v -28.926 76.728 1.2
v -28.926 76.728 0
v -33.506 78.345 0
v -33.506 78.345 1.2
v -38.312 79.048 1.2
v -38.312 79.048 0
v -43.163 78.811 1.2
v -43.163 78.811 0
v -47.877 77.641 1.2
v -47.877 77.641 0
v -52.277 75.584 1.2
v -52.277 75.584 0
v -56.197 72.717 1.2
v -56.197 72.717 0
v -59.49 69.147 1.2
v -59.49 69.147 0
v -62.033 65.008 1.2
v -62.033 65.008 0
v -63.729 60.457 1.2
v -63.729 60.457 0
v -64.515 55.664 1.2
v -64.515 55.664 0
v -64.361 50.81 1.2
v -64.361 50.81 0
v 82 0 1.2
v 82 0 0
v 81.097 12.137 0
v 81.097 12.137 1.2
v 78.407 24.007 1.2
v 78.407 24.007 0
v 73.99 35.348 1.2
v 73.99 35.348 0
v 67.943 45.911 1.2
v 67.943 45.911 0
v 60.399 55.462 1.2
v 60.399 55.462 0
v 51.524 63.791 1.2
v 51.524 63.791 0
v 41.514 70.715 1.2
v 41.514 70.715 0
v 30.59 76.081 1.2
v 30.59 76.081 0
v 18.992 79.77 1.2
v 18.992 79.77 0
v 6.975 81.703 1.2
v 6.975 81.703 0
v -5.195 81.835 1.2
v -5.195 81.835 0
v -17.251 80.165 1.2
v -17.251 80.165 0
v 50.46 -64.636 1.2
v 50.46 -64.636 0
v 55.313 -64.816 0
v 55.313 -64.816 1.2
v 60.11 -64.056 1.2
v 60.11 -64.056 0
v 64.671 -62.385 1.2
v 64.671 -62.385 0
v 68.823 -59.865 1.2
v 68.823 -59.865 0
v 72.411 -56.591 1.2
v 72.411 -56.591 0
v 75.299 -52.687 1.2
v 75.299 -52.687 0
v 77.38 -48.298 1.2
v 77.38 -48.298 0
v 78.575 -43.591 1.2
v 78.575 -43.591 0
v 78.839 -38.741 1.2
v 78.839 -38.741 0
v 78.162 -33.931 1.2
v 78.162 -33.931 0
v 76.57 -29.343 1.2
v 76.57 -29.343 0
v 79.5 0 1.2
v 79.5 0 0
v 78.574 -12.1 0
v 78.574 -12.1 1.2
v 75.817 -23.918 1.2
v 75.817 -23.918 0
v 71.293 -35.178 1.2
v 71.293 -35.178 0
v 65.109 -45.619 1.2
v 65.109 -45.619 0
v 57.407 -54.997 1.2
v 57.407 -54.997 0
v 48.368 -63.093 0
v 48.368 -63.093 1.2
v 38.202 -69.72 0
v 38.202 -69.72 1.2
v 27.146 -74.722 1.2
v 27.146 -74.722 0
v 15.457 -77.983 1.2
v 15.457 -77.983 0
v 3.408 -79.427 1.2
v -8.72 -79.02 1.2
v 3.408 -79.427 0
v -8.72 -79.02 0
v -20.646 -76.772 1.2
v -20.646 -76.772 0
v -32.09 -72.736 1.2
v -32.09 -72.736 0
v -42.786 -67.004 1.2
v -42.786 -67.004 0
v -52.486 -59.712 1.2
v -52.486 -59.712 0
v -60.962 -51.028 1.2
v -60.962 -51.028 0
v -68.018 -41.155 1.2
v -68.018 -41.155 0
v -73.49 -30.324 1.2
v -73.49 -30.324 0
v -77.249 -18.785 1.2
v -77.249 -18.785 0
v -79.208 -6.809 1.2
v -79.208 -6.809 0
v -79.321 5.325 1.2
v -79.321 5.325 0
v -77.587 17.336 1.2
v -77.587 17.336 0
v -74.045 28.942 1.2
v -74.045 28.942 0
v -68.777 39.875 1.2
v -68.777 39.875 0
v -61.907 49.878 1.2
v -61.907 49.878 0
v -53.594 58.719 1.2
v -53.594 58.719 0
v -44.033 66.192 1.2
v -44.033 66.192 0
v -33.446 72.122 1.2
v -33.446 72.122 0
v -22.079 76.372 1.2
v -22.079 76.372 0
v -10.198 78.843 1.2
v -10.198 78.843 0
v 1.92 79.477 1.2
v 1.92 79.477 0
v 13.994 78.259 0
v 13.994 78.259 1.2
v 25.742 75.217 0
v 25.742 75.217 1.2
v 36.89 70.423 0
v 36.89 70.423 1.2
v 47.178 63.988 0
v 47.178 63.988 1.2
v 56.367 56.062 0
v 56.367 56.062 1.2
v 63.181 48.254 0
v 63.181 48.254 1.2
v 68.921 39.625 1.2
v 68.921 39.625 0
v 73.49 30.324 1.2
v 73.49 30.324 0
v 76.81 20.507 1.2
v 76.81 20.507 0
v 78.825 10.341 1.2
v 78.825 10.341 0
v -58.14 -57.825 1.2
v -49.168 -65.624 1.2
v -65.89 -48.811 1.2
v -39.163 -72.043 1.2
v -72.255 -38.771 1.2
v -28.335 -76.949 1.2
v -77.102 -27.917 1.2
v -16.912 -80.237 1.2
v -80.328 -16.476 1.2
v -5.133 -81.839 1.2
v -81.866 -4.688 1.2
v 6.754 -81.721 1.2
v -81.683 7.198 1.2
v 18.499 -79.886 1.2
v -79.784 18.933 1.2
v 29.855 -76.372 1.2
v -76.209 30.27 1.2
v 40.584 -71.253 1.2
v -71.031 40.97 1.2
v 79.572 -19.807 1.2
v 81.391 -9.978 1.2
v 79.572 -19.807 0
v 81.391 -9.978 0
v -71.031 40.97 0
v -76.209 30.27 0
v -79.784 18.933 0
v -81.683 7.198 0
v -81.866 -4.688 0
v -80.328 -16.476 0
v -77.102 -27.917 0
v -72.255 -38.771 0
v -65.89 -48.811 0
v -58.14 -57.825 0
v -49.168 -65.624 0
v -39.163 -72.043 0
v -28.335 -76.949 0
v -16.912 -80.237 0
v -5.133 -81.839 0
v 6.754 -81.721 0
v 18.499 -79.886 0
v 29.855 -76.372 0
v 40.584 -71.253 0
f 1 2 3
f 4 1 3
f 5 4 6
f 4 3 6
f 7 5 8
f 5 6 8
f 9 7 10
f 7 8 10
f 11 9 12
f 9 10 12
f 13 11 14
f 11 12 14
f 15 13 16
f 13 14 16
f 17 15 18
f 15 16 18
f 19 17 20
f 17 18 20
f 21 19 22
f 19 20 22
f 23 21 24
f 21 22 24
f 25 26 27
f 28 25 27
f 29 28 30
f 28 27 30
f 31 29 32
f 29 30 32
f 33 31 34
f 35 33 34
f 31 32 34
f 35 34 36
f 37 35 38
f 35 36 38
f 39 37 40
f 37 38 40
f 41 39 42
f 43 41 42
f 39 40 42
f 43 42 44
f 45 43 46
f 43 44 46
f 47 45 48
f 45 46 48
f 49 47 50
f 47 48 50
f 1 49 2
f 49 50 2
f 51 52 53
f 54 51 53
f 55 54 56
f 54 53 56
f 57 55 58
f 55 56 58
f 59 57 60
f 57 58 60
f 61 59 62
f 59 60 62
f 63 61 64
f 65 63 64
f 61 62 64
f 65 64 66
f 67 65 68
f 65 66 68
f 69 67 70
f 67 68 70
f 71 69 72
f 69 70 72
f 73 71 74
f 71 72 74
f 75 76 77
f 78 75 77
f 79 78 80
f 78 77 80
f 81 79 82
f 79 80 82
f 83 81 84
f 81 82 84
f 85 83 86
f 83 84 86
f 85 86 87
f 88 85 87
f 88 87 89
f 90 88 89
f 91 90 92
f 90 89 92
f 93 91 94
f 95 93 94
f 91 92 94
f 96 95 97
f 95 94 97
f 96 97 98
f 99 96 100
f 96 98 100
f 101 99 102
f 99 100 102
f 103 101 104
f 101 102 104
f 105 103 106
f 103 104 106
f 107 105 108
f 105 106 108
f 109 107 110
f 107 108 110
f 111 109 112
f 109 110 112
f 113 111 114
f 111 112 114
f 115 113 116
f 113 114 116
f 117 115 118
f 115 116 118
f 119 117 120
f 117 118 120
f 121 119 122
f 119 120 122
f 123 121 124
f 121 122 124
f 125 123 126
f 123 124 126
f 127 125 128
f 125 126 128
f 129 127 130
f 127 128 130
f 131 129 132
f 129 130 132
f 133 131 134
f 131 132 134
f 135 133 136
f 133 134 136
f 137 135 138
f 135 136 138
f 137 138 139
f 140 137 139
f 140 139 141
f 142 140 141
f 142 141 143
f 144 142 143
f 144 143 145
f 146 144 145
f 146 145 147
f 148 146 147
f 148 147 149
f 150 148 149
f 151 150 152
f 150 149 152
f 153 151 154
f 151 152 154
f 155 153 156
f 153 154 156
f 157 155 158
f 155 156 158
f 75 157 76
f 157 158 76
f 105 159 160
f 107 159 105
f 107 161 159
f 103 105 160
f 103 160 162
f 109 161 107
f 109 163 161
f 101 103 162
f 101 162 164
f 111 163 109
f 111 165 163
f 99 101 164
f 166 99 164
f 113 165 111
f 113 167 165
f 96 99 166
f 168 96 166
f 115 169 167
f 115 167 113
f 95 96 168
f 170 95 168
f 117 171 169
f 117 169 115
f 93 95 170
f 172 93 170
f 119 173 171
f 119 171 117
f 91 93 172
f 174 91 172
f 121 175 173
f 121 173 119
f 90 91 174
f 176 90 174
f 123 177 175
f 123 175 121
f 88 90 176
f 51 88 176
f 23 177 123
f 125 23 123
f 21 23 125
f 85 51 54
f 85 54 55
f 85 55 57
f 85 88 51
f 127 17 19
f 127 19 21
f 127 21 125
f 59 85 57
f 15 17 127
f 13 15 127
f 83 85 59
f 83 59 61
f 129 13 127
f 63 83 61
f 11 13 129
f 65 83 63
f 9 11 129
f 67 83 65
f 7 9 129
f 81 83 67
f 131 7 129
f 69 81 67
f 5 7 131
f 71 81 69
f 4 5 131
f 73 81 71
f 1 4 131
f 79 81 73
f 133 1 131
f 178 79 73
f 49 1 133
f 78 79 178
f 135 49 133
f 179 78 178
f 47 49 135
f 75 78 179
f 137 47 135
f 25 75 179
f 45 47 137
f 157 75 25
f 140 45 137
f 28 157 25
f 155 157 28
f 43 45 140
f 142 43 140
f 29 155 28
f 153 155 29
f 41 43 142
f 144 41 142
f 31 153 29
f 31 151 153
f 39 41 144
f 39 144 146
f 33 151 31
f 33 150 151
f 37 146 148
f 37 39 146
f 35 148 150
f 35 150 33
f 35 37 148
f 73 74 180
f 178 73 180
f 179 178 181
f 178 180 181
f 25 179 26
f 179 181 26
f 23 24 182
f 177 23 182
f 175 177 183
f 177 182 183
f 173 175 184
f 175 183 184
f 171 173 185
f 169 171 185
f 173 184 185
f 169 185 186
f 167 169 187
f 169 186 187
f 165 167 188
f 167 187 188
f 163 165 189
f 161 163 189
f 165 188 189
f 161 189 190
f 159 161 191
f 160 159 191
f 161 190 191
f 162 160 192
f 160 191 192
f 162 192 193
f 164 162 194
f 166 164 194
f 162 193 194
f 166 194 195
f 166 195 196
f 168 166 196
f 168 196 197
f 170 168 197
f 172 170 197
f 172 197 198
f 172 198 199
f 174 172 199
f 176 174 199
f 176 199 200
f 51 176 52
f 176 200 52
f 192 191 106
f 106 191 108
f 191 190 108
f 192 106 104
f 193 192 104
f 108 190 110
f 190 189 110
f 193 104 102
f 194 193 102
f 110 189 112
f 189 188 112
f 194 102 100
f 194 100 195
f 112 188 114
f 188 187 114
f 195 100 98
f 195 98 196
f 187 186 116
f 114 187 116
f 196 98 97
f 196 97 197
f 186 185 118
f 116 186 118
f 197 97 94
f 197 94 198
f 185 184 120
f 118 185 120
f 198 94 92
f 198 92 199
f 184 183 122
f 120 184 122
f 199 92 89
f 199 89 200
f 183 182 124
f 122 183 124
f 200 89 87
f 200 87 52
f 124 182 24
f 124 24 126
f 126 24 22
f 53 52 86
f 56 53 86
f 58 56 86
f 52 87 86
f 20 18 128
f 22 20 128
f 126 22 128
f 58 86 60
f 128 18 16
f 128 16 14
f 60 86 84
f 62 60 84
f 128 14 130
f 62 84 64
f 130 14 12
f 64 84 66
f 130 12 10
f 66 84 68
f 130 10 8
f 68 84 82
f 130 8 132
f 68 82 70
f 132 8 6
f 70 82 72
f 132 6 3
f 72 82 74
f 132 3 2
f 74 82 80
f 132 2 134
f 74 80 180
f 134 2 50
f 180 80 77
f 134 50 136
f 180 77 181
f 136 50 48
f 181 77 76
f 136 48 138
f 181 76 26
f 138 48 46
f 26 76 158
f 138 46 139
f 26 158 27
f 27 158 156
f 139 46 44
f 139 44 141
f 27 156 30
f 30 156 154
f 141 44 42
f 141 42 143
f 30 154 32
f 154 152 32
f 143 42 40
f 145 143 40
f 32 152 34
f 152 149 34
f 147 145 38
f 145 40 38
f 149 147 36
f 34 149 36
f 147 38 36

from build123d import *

# Parameters (mm, degrees)
F1_DEPTH = 1.2


with BuildPart() as f1:
    # F0 (on Top) → F1 (new body)
    with BuildSketch(Plane.XY):
        with BuildLine():
            ThreePointArc((76.570266, -29.342705), (80.631141, -14.920425), (82, 0))
            ThreePointArc((82, 0), (46.647786, 67.438743), (-28.926442, 76.728489))
            ThreePointArc((-28.926442, 76.728489), (-48.410565, 66.18472), (-64.361077, 50.809958))
            ThreePointArc((-64.361077, 50.809958), (-58.139986, -57.825098), (50.459683, -64.636061))
            ThreePointArc((50.459683, -64.636061), (65.920841, -48.769281), (76.570266, -29.342705))
        make_face()
        with BuildLine():
            ThreePointArc((56.367426, 56.062138), (73.48966, 30.323585), (79.5, 0))
            ThreePointArc((79.5, 0), (-73.48966, -30.323585), (56.367426, 56.062138))
        make_face(mode=Mode.SUBTRACT)
        with BuildLine():
            ThreePointArc((-64.361077, 50.809958), (-48.410565, 66.18472), (-28.926442, 76.728489))
            ThreePointArc((-28.926442, 76.728489), (-54.306729, 74.245687), (-64.361077, 50.809958))
        make_face()
        with BuildLine():
            ThreePointArc((50.459683, -64.636061), (73.949669, -54.709135), (76.570266, -29.342705))
            ThreePointArc((76.570266, -29.342705), (65.920841, -48.769281), (50.459683, -64.636061))
        make_face()
    extrude(amount=F1_DEPTH)


solid = f1.part
